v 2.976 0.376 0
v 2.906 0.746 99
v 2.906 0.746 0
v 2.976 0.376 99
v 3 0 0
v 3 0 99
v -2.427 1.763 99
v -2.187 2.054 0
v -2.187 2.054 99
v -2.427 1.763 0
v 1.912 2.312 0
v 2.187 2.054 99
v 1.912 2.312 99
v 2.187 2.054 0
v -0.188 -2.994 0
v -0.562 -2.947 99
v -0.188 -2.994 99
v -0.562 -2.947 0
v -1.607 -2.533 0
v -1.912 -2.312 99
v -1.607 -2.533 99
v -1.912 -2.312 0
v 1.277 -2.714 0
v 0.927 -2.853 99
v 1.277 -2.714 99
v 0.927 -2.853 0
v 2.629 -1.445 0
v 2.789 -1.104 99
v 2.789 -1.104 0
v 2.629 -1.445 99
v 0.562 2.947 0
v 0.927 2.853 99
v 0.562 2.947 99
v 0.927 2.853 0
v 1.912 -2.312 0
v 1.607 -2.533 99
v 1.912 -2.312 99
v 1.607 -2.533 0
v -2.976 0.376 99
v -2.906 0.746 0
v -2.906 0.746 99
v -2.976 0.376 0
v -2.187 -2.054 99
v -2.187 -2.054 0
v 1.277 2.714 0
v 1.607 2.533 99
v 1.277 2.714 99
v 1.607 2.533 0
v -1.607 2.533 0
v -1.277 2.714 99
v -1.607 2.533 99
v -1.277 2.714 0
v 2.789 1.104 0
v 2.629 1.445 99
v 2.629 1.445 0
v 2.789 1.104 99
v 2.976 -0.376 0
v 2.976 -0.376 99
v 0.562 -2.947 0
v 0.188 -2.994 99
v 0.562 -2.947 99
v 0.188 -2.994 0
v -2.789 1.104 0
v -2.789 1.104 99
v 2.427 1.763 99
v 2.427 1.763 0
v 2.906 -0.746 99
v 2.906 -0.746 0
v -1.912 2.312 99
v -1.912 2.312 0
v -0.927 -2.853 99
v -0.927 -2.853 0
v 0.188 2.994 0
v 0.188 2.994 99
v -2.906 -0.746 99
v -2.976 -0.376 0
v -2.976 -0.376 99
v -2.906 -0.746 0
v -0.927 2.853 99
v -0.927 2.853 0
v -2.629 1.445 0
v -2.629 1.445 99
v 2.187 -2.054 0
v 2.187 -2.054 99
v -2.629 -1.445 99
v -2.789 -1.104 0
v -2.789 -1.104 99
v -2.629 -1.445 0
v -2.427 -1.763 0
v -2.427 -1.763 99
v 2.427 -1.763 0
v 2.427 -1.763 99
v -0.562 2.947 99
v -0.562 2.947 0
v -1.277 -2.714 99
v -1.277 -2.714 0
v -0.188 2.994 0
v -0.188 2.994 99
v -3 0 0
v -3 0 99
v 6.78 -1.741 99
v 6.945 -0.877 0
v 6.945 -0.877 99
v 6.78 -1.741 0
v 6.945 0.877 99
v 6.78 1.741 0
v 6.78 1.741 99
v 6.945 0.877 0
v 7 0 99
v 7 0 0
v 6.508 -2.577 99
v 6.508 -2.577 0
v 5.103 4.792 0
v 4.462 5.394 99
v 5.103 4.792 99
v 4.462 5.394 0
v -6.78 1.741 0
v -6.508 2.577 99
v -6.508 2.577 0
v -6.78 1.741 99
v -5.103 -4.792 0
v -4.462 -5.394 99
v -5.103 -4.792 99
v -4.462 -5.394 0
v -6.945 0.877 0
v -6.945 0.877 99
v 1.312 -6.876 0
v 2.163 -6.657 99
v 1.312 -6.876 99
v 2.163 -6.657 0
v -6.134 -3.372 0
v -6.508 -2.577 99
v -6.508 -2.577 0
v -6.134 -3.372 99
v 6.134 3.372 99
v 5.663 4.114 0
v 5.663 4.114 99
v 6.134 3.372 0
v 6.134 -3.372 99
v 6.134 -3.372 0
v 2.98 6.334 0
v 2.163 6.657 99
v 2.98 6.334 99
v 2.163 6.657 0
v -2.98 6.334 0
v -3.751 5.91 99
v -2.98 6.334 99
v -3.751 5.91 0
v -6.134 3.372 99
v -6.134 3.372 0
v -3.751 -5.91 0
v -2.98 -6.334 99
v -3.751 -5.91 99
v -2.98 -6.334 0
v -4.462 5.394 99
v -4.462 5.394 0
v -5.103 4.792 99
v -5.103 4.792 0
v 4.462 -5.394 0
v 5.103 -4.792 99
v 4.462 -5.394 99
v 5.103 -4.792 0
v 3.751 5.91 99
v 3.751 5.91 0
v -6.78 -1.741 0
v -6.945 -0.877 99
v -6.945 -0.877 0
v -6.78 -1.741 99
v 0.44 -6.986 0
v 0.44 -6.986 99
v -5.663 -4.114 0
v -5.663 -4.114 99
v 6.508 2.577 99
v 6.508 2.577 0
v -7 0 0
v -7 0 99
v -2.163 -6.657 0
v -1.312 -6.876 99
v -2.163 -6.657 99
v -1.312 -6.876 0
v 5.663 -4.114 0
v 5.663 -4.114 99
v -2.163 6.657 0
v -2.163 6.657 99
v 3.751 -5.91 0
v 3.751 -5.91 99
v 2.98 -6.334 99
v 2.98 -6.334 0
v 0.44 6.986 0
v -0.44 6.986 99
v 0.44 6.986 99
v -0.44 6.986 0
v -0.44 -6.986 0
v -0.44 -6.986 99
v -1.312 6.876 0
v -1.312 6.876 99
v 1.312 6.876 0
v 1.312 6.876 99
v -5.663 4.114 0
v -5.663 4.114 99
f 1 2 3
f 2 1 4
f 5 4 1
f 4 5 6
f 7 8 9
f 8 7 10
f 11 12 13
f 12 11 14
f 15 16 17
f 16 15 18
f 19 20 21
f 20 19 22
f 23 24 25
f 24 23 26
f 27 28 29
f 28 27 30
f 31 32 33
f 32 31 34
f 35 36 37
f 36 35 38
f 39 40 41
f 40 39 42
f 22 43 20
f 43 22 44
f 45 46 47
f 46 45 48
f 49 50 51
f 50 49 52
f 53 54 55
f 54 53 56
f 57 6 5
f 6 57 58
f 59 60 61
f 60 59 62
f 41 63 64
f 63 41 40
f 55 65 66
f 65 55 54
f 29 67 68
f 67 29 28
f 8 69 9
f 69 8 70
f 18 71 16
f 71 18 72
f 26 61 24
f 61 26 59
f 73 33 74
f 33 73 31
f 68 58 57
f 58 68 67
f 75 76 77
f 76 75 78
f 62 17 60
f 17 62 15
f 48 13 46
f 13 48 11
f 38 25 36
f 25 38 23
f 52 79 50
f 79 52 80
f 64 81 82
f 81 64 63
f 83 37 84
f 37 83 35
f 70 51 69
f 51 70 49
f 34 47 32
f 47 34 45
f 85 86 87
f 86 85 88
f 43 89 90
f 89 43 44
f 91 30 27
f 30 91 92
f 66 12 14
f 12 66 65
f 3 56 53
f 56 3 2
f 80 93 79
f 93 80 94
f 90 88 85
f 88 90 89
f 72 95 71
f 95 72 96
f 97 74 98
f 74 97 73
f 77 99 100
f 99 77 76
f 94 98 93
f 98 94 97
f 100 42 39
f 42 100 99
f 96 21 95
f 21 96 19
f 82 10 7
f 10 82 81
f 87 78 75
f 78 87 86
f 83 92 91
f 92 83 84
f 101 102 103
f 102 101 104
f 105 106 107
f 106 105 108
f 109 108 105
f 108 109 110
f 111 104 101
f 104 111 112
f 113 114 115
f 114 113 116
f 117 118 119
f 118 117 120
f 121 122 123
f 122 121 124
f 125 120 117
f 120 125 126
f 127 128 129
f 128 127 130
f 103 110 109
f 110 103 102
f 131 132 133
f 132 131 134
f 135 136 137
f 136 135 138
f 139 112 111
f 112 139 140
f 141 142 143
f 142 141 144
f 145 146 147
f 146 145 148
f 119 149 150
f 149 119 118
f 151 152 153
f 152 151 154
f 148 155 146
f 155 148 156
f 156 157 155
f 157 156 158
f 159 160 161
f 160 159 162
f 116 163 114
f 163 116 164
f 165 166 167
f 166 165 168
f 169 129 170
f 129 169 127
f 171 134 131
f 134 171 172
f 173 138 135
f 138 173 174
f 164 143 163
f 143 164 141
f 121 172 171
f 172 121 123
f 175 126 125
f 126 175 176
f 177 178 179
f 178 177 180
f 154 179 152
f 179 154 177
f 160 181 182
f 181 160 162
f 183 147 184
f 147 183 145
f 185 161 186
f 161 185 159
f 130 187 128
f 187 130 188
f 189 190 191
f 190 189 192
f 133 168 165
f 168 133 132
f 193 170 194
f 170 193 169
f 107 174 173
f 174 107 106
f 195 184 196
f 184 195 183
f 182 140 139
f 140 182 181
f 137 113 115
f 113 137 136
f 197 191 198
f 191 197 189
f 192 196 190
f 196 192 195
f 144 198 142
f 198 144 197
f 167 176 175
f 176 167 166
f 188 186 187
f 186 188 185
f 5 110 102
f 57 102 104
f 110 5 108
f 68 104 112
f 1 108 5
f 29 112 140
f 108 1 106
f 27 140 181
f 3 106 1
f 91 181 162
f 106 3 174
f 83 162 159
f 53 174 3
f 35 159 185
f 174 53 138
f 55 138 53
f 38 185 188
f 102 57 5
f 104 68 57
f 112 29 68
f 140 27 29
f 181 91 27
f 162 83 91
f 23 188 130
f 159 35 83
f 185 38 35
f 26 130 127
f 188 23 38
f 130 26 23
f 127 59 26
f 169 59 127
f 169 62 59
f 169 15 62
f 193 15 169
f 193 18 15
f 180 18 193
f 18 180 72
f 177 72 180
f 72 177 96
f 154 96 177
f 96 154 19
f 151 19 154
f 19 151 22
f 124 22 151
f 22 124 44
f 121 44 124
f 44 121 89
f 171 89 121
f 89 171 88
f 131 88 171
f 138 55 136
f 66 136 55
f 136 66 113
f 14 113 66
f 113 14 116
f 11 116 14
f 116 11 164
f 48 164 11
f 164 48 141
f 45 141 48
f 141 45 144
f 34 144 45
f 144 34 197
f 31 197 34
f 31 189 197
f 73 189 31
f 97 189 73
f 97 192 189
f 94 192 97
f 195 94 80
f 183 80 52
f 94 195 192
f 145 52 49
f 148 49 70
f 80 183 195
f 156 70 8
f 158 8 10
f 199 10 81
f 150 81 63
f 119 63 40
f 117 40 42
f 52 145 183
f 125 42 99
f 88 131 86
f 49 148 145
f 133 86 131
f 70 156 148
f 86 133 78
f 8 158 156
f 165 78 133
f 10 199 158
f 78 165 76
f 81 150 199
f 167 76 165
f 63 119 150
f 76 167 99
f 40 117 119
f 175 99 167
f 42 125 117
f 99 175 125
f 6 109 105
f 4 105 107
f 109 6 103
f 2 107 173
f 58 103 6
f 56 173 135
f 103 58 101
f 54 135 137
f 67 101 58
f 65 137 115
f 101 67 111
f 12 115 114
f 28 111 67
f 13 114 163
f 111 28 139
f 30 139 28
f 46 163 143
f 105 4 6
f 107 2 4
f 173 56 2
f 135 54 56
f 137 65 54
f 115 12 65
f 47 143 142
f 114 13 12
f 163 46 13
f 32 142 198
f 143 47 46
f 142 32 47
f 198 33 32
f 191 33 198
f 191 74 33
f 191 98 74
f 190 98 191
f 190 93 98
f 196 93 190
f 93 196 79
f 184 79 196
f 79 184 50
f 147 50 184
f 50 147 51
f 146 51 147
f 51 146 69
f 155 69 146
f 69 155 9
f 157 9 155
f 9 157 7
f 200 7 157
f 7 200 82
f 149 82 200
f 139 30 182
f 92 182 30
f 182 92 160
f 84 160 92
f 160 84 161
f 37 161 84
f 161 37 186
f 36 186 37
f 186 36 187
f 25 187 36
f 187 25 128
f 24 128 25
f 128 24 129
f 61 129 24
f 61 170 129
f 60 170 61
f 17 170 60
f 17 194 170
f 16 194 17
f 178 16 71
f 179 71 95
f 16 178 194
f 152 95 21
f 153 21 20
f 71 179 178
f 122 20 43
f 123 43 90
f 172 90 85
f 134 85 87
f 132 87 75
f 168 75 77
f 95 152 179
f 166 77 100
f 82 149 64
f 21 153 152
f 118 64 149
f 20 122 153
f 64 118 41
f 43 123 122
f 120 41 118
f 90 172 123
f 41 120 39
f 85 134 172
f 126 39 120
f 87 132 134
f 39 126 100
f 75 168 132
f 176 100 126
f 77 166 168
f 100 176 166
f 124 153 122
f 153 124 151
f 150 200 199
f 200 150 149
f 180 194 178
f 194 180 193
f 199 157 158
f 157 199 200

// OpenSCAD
$fn = 50;


difference() {
	union() {
		cylinder(h = 99, r = 7.0000000000);
	}
	union() {
		translate(v = [0.0000000000, 0.0000000000, -100.0000000000]) {
			cylinder(h = 200, r = 3.0000000000);
		}
		translate(v = [0.0000000000, 0.0000000000, -100.0000000000]) {
			cylinder(h = 200, r = 3.0000000000);
		}
		translate(v = [0.0000000000, 0.0000000000, -100.0000000000]) {
			cylinder(h = 200, r = 3.0000000000);
		}
		translate(v = [0.0000000000, 0.0000000000, -100.0000000000]) {
			cylinder(h = 200, r = 3.0000000000);
		}
	}
}
